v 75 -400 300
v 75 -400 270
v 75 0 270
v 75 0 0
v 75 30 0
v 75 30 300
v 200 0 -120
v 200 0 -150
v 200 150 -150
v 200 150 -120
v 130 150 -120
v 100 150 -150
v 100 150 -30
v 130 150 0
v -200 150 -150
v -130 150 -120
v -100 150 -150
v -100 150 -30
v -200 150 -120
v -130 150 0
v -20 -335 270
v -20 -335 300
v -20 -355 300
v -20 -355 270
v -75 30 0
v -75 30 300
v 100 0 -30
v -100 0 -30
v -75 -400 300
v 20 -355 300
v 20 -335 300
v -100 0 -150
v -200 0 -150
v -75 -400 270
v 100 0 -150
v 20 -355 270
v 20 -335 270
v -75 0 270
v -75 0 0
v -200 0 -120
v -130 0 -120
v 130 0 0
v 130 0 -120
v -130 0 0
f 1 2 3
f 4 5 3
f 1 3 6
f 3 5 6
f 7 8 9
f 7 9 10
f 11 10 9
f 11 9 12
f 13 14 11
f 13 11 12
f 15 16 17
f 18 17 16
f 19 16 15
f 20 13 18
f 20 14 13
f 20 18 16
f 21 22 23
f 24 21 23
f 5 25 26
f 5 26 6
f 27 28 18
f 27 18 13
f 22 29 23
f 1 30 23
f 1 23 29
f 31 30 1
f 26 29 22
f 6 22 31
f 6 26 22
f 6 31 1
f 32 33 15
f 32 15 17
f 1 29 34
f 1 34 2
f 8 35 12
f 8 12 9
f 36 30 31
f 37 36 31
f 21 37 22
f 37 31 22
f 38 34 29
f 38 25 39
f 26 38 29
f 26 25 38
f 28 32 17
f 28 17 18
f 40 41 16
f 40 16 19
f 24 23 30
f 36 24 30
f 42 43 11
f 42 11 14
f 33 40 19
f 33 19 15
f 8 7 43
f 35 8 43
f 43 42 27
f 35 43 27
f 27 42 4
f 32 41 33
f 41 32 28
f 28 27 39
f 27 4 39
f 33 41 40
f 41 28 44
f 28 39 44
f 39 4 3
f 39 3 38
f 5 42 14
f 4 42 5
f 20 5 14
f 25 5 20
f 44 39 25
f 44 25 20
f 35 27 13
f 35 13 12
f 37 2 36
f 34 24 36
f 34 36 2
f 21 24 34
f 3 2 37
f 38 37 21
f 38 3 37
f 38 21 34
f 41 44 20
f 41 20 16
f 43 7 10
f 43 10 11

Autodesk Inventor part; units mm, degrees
ref_plane "YZ Plane" through (0, 0, 0) normal (1, 0, 0) x (0, 1, 0)
ref_plane "XZ Plane" through (0, 0, 0) normal (0, 1, 0) x (-1, 0, 0)
ref_plane "XY Plane" through (0, 0, 0) normal (0, 0, 1) x (1, 0, 0)
sketch "Skizze1" plane through (0, 0, 0) normal (0, 1, 0) x (-1, 0, 0)
  line L0 (200, -150) -> (100, -150)
  line L1 (100, -150) -> (100, -30)
  line L2 (100, -30) -> (-100, -30)
  line L3 (-100, -30) -> (-100, -150)
  line L4 (-100, -150) -> (-200, -150)
  line L5 (-200, -150) -> (-200, -120)
  line L6 (-200, -120) -> (-130, -120)
  line L7 (-130, -120) -> (-130, 0)
  line L8 (-130, 0) -> (130, 0)
  line L9 (130, 0) -> (130, -120)
  line L10 (130, -120) -> (200, -120)
  line L11 (200, -120) -> (200, -150)
  line L12 (0, -180) -> (0, 30) projected
  point P0 (0, 0)
  dimension "d0" = 30
  dimension "d1" = 30
  dimension "d3" = 30
  dimension "d4" = 200
  dimension "d5" = 100
  dimension "d6" = 150
extrude "Extrusion1" add sketch "Skizze1" along normal blind 150
sketch "Skizze2" plane through (-130, 0, 0) normal (0, 0, 1) x (1, 0, 0)
  line L0 (230, 0) -> (30, 0) projected
  line L1 (55, 30) -> (205, 30)
  line L2 (205, 30) -> (205, 0)
  line L3 (205, 0) -> (55, 0)
  line L4 (55, 0) -> (55, 30)
  line L5 (260, 0) -> (260, 150) projected
  line L6 (0, 0) -> (0, 150) projected
  point P0 (130, 0)
  dimension "d9" = 260
  dimension "d10" = 30
  dimension "d11" = 150
  dimension "d12" = 55
extrude "Extrusion2" add sketch "Skizze2" along normal blind 300
sketch "Skizze3" plane through (0, 0, 0) normal (0, -1, 0) x (1, 0, 0)
  line L0 (-75, 300) -> (75, 300) projected
  line L1 (75, 0) -> (75, 300) projected
  line L2 (-75, 300) -> (75, 300)
  line L3 (75, 300) -> (75, 270)
  line L4 (75, 270) -> (-75, 270)
  line L5 (-75, 270) -> (-75, 300)
  point P0 (0, 0)
  dimension "d15" = 30
extrude "Extrusion3" add sketch "Skizze3" along normal blind 400
sketch "Skizze4" plane through (-130, 0, 300) normal (0, 0, 1) x (1, 0, 0)
  line L0 (110, -355) -> (150, -355)
  line L1 (150, -355) -> (150, -335)
  line L2 (150, -335) -> (110, -335)
  line L3 (110, -335) -> (110, -355)
  line L4 (110, -355) -> (150, -335) construction
  line L5 (150, -355) -> (110, -335) construction
  point P0 (130, 0)
  point P1 (130, -345)
  dimension "d18" = 40
  dimension "d19" = 20
  dimension "d20" = 345
  dimension "d21" = 0
extrude "Extrusion4" cut sketch "Skizze4" against normal through all
equation "\"d1\" = d0"
equation "\"d3\" = d0"
equation "\"d12\" = -0.5 * d11 + 0.5 * d9"
properties part number "Staender"
